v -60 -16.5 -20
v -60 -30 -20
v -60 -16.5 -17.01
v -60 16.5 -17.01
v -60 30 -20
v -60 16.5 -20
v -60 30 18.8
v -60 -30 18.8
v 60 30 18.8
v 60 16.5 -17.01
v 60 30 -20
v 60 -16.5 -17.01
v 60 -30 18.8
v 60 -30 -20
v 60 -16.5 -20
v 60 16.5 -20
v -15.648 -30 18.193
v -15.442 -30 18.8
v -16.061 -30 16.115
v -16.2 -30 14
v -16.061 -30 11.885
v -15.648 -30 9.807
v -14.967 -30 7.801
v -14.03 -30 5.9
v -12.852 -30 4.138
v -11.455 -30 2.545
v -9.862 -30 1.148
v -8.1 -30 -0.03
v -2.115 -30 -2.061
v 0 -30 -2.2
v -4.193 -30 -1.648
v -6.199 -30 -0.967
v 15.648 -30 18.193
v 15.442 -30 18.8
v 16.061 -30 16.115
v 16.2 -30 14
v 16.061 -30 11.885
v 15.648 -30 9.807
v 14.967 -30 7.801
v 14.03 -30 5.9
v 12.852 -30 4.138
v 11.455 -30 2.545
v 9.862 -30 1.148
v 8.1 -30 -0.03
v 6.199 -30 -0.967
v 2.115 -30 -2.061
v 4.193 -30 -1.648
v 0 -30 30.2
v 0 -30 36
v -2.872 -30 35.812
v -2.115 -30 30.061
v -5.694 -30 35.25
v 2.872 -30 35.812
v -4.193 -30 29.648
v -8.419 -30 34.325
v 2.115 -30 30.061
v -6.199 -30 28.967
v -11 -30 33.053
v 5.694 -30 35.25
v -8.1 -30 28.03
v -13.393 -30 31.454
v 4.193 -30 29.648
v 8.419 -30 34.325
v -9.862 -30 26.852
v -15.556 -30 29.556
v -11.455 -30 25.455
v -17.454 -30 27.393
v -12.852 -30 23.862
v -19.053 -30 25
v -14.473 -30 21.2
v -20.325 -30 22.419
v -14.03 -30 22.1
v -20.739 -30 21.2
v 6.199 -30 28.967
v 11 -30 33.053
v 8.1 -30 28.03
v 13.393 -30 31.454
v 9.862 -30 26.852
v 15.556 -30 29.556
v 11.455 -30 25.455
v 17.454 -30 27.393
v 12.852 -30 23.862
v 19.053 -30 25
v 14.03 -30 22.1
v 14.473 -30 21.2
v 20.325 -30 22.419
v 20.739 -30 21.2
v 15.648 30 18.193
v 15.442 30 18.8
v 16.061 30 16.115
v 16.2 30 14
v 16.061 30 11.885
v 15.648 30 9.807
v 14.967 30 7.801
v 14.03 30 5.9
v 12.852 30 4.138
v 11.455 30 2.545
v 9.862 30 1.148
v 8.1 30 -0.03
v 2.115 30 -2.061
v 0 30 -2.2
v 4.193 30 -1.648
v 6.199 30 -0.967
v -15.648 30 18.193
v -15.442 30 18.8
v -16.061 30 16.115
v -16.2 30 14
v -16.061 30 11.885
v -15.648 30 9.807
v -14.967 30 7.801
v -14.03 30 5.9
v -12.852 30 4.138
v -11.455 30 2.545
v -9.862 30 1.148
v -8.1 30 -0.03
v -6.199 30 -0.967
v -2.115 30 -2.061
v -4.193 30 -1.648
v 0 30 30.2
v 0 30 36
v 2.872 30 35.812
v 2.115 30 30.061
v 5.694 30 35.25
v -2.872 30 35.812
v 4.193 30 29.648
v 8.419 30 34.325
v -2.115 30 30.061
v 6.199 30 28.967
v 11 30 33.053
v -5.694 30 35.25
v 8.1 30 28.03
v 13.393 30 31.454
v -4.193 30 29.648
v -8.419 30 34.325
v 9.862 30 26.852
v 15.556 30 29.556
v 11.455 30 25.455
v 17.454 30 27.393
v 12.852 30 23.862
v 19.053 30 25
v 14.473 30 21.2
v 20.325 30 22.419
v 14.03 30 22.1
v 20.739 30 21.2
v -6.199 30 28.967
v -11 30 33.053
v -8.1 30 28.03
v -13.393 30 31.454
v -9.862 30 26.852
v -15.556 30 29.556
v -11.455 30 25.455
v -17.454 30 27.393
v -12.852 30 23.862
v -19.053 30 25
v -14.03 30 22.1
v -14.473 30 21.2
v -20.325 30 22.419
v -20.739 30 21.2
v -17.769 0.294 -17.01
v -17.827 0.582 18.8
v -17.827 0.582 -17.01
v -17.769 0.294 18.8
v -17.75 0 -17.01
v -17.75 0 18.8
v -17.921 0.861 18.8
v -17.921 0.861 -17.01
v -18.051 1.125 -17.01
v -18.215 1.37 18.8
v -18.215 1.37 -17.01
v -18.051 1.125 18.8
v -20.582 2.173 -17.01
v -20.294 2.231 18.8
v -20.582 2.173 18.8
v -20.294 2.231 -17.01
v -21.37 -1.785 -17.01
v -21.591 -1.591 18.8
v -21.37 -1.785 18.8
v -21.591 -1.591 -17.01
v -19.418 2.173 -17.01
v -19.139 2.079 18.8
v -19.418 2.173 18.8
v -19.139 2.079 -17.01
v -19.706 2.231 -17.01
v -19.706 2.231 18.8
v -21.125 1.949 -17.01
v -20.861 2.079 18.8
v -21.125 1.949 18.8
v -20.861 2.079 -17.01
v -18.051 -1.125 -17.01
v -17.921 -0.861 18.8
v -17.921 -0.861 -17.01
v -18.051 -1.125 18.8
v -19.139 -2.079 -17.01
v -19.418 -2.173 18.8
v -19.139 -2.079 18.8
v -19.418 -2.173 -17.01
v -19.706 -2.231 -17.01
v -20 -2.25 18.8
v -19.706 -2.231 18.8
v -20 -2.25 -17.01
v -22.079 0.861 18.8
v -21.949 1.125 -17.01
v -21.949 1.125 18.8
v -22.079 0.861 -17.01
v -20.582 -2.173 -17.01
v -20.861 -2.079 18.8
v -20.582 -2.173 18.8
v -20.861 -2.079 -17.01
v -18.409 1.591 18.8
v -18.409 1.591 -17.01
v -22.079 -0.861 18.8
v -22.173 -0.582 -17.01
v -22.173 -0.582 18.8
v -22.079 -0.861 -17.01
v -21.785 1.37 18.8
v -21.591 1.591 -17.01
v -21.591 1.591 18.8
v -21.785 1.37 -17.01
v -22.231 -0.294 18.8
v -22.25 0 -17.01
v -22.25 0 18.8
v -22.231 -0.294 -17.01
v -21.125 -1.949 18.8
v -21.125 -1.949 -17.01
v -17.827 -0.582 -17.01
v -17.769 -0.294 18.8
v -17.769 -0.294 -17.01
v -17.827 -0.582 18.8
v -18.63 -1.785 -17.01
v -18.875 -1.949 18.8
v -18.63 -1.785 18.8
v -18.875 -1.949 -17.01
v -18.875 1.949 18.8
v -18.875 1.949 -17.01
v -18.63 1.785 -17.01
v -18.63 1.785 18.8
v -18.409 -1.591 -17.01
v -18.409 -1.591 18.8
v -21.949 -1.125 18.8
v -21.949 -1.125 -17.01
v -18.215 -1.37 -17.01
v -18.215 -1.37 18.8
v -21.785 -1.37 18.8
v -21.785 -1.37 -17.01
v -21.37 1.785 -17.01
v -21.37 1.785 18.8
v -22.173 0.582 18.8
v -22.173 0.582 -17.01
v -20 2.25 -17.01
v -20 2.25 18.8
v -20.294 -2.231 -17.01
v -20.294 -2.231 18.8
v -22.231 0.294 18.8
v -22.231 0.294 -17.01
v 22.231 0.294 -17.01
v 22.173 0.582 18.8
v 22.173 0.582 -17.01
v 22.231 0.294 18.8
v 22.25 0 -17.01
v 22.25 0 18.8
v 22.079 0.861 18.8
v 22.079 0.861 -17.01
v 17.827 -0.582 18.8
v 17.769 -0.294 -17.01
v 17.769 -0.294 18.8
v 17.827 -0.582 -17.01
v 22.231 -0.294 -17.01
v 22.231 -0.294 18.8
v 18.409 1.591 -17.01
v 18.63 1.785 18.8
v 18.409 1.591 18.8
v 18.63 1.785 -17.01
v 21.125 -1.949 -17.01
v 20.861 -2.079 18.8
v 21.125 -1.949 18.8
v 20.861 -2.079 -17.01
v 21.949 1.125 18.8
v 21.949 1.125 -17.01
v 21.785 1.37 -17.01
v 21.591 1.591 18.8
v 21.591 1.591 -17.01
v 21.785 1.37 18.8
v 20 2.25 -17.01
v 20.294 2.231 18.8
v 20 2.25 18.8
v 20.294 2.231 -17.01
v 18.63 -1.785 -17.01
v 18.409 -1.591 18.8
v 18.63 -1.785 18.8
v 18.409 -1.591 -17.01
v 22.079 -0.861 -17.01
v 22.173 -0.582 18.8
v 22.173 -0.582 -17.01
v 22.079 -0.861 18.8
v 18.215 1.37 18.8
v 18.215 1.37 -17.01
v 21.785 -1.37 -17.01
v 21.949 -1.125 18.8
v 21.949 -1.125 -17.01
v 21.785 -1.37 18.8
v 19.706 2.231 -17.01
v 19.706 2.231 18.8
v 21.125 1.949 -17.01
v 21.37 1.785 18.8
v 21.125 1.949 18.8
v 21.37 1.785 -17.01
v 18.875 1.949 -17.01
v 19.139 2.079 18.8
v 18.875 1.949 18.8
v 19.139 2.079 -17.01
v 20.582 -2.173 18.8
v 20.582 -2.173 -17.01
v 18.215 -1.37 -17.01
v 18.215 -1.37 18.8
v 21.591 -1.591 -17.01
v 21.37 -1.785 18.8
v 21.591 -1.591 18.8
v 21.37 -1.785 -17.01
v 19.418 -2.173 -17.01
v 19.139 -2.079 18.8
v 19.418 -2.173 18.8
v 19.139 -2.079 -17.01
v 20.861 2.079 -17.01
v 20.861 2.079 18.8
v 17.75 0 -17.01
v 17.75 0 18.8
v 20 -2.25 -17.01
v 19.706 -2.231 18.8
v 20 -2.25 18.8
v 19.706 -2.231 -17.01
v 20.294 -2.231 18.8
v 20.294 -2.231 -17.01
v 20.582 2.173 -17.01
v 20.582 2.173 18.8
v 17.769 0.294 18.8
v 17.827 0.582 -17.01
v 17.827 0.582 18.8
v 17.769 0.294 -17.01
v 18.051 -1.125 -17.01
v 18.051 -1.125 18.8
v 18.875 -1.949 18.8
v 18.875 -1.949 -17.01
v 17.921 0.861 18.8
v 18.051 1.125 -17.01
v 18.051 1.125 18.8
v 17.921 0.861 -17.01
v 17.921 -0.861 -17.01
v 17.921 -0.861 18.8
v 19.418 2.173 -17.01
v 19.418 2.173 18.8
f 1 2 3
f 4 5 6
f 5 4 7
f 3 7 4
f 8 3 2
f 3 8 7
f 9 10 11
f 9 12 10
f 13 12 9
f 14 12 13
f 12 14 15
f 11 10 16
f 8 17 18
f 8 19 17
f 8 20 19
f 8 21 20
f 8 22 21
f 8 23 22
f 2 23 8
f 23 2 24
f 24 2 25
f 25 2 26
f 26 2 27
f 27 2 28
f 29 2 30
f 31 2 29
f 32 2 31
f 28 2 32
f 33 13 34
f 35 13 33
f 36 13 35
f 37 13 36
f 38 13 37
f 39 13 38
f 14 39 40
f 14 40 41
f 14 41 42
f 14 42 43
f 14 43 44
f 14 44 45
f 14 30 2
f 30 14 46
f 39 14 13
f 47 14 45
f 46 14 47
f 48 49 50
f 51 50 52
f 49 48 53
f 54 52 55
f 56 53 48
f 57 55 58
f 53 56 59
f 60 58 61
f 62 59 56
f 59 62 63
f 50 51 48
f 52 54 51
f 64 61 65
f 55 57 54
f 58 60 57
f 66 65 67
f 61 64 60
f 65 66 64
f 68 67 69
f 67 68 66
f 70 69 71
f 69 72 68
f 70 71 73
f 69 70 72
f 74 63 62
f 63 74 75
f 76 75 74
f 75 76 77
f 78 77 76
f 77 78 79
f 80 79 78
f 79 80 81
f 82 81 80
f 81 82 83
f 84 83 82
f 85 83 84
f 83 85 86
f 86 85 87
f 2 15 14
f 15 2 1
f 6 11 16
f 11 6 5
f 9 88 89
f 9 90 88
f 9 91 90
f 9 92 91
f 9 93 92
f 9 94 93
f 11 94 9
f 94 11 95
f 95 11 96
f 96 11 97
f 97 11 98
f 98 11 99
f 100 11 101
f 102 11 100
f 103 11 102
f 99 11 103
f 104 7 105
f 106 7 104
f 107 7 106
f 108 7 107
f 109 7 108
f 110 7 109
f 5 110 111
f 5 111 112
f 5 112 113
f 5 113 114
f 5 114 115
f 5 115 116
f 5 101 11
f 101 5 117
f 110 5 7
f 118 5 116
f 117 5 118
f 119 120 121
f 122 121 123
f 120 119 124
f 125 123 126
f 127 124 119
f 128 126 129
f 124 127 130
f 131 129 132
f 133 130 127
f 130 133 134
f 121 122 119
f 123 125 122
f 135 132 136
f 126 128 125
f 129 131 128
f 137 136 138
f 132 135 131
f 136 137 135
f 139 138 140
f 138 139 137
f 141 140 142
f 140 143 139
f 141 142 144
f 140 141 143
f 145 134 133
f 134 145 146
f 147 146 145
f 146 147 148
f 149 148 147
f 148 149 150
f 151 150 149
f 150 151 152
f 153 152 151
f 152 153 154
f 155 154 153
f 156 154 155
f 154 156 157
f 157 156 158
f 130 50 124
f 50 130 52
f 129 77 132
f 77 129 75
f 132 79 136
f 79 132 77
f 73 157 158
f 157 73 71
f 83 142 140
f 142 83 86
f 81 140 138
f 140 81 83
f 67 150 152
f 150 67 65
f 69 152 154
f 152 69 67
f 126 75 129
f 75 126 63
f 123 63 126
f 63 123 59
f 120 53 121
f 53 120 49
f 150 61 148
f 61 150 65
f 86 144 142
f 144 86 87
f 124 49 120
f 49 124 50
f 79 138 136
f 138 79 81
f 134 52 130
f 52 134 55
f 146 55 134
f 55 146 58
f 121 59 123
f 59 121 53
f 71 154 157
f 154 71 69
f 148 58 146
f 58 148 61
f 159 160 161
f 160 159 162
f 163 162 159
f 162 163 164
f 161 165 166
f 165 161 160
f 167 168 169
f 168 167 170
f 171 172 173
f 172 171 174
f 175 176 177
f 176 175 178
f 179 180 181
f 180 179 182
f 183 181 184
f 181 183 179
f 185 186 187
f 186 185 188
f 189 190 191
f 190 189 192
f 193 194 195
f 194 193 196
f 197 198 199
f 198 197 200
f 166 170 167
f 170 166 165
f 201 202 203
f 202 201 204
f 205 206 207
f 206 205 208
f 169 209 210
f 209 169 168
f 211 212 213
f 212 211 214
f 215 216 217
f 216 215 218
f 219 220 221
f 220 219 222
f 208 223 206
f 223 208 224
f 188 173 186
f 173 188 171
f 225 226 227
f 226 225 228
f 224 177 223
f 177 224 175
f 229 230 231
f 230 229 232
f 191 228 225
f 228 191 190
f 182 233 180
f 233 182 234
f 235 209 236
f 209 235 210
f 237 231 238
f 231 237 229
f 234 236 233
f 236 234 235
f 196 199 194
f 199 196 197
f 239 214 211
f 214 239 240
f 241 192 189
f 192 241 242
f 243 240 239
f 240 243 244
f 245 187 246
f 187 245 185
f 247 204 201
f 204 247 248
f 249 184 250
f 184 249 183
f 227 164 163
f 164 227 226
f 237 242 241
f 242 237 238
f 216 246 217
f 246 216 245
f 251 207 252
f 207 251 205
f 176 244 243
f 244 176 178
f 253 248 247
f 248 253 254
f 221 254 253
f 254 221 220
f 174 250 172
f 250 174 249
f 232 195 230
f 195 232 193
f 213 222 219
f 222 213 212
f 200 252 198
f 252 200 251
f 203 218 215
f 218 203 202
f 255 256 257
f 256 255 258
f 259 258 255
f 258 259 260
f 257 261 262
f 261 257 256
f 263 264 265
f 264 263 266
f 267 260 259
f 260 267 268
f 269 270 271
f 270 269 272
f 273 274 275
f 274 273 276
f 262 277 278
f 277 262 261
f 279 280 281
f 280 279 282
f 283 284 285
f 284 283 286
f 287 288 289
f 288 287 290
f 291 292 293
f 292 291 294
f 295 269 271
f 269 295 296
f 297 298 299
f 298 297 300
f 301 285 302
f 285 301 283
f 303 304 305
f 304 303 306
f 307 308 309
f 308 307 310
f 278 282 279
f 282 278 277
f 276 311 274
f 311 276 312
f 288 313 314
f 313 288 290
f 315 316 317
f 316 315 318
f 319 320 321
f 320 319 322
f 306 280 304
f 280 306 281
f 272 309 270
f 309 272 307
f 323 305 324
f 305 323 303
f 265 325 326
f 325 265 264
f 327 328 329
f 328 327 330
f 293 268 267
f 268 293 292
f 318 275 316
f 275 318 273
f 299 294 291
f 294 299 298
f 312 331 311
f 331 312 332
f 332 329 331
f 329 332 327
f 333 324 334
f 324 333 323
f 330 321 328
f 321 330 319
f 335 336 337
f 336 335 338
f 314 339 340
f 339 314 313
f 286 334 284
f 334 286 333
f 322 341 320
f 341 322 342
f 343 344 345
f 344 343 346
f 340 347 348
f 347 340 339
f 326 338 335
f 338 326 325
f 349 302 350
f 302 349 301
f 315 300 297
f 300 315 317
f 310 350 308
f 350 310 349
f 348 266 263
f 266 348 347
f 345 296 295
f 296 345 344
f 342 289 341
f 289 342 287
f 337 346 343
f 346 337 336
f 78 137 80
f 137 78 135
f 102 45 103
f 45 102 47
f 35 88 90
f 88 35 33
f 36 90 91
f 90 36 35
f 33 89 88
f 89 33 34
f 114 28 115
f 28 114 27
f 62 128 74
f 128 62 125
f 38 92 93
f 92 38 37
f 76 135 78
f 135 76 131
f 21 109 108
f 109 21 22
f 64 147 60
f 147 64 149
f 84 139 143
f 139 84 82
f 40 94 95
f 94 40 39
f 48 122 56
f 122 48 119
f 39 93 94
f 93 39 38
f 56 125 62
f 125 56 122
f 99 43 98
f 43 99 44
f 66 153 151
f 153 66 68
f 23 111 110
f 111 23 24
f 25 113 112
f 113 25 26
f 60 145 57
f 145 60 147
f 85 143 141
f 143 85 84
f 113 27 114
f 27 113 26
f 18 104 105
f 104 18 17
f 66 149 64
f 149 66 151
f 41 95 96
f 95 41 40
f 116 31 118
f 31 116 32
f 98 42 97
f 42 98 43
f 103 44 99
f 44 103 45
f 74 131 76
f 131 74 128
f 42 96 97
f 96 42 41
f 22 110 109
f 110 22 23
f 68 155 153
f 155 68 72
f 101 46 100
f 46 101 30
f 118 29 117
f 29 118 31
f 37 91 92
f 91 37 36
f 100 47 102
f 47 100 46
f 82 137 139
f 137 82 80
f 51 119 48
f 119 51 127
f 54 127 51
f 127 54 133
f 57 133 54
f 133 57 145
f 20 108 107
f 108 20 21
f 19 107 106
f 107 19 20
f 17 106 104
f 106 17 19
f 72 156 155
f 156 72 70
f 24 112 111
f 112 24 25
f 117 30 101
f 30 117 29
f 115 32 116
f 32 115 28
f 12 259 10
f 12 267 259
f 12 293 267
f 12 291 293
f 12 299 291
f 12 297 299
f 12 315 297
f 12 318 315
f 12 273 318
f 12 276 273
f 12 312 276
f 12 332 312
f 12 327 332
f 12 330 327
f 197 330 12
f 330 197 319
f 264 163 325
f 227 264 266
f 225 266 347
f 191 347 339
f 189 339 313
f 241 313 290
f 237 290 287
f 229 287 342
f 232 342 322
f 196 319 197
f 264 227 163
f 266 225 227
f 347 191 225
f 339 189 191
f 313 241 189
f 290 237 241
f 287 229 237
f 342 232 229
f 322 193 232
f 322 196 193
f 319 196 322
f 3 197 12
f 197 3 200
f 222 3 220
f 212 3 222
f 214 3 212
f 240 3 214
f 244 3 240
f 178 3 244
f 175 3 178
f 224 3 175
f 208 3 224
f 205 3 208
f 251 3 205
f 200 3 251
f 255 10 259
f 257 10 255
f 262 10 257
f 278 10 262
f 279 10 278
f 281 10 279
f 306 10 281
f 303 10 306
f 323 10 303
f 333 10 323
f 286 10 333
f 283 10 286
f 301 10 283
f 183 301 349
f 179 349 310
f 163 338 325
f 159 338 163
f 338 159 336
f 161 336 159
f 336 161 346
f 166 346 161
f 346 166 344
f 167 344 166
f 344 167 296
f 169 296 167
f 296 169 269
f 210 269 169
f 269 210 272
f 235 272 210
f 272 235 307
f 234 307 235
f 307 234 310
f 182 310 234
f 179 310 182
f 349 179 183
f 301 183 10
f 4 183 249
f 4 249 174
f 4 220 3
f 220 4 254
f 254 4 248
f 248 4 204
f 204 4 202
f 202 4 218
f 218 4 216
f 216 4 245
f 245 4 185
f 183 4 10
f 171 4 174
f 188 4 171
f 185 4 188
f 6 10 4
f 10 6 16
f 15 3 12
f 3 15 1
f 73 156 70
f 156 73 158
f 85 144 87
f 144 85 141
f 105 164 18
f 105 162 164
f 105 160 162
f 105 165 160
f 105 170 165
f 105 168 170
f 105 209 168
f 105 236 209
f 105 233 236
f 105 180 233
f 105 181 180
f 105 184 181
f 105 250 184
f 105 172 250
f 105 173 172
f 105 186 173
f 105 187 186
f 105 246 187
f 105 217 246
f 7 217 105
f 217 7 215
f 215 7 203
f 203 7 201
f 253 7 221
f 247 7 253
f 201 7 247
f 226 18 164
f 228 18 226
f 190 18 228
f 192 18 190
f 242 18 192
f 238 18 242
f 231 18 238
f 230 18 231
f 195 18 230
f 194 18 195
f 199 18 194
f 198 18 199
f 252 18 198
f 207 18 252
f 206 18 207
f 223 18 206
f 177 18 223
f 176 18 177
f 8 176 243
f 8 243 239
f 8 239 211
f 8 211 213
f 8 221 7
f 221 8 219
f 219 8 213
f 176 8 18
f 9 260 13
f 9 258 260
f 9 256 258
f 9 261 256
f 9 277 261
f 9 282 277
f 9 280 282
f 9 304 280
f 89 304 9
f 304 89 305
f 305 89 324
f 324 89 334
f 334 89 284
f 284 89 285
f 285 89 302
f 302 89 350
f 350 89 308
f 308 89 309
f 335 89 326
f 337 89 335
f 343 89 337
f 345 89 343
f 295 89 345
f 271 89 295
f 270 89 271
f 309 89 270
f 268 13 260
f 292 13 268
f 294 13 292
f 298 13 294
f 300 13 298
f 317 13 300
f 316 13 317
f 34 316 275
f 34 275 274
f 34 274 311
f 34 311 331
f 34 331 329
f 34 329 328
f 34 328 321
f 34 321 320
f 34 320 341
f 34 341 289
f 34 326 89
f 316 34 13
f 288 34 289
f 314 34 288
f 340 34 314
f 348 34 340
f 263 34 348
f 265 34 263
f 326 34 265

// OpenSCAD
// Example: a wall bracket for a 32 mm pipe, in OpenSCAD.
//
//   forge3d create --name bracket --purpose print --backend openscad \
//       --source examples/openscad_bracket.scad --dims x=120,y=60,z=40
//
// Everything is a parameter. Change PIPE_D for a different pipe and the whole
// part re-derives — which is the reason to use CSG for hard-surface work.

PIPE_D   = 32;     // pipe outer diameter, mm
CLEAR    = 0.4;    // clearance so the pipe actually fits, mm
WALL     = 6;      // wall thickness, mm
W        = 120;    // overall width
D        = 60;     // overall depth
H        = 40;     // overall height
HOLE_D   = 4.5;    // M4 clearance
HOLE_X   = 40;     // hole spacing (both axes)
CHAMFER  = 1.2;

$fn = 48;

module saddle() {
    difference() {
        union() {
            // body
            hull() {
                cube([W, D, H], center = true);
            }
            // outer barrel so the pipe seats in a round cradle
            translate([0, 0, H / 2 - WALL])
                rotate([90, 0, 0])
                    cylinder(d = PIPE_D + 2 * WALL, h = D, center = true);
        }

        // pipe channel
        translate([0, 0, H / 2 - WALL])
            rotate([90, 0, 0])
                cylinder(d = PIPE_D + CLEAR, h = D + 2, center = true);

        // mounting holes
        for (x = [-HOLE_X / 2, HOLE_X / 2]) {
            translate([x, 0, 0])
                cylinder(d = HOLE_D, h = H + 2, center = true);
        }

        // relieve the underside so it sits flat against a wall
        translate([0, 0, -H / 2 - 0.01])
            cube([W + 2, D * 0.55, WALL], center = true);
    }
}

module chamfered() {
    // a light chamfer reads as "manufactured" rather than "extruded"
    difference() {
        saddle();
        translate([0, 0, H / 2])
            cube([W + 2, D + 2, 2 * CHAMFER], center = true);
    }
}

chamfered();
